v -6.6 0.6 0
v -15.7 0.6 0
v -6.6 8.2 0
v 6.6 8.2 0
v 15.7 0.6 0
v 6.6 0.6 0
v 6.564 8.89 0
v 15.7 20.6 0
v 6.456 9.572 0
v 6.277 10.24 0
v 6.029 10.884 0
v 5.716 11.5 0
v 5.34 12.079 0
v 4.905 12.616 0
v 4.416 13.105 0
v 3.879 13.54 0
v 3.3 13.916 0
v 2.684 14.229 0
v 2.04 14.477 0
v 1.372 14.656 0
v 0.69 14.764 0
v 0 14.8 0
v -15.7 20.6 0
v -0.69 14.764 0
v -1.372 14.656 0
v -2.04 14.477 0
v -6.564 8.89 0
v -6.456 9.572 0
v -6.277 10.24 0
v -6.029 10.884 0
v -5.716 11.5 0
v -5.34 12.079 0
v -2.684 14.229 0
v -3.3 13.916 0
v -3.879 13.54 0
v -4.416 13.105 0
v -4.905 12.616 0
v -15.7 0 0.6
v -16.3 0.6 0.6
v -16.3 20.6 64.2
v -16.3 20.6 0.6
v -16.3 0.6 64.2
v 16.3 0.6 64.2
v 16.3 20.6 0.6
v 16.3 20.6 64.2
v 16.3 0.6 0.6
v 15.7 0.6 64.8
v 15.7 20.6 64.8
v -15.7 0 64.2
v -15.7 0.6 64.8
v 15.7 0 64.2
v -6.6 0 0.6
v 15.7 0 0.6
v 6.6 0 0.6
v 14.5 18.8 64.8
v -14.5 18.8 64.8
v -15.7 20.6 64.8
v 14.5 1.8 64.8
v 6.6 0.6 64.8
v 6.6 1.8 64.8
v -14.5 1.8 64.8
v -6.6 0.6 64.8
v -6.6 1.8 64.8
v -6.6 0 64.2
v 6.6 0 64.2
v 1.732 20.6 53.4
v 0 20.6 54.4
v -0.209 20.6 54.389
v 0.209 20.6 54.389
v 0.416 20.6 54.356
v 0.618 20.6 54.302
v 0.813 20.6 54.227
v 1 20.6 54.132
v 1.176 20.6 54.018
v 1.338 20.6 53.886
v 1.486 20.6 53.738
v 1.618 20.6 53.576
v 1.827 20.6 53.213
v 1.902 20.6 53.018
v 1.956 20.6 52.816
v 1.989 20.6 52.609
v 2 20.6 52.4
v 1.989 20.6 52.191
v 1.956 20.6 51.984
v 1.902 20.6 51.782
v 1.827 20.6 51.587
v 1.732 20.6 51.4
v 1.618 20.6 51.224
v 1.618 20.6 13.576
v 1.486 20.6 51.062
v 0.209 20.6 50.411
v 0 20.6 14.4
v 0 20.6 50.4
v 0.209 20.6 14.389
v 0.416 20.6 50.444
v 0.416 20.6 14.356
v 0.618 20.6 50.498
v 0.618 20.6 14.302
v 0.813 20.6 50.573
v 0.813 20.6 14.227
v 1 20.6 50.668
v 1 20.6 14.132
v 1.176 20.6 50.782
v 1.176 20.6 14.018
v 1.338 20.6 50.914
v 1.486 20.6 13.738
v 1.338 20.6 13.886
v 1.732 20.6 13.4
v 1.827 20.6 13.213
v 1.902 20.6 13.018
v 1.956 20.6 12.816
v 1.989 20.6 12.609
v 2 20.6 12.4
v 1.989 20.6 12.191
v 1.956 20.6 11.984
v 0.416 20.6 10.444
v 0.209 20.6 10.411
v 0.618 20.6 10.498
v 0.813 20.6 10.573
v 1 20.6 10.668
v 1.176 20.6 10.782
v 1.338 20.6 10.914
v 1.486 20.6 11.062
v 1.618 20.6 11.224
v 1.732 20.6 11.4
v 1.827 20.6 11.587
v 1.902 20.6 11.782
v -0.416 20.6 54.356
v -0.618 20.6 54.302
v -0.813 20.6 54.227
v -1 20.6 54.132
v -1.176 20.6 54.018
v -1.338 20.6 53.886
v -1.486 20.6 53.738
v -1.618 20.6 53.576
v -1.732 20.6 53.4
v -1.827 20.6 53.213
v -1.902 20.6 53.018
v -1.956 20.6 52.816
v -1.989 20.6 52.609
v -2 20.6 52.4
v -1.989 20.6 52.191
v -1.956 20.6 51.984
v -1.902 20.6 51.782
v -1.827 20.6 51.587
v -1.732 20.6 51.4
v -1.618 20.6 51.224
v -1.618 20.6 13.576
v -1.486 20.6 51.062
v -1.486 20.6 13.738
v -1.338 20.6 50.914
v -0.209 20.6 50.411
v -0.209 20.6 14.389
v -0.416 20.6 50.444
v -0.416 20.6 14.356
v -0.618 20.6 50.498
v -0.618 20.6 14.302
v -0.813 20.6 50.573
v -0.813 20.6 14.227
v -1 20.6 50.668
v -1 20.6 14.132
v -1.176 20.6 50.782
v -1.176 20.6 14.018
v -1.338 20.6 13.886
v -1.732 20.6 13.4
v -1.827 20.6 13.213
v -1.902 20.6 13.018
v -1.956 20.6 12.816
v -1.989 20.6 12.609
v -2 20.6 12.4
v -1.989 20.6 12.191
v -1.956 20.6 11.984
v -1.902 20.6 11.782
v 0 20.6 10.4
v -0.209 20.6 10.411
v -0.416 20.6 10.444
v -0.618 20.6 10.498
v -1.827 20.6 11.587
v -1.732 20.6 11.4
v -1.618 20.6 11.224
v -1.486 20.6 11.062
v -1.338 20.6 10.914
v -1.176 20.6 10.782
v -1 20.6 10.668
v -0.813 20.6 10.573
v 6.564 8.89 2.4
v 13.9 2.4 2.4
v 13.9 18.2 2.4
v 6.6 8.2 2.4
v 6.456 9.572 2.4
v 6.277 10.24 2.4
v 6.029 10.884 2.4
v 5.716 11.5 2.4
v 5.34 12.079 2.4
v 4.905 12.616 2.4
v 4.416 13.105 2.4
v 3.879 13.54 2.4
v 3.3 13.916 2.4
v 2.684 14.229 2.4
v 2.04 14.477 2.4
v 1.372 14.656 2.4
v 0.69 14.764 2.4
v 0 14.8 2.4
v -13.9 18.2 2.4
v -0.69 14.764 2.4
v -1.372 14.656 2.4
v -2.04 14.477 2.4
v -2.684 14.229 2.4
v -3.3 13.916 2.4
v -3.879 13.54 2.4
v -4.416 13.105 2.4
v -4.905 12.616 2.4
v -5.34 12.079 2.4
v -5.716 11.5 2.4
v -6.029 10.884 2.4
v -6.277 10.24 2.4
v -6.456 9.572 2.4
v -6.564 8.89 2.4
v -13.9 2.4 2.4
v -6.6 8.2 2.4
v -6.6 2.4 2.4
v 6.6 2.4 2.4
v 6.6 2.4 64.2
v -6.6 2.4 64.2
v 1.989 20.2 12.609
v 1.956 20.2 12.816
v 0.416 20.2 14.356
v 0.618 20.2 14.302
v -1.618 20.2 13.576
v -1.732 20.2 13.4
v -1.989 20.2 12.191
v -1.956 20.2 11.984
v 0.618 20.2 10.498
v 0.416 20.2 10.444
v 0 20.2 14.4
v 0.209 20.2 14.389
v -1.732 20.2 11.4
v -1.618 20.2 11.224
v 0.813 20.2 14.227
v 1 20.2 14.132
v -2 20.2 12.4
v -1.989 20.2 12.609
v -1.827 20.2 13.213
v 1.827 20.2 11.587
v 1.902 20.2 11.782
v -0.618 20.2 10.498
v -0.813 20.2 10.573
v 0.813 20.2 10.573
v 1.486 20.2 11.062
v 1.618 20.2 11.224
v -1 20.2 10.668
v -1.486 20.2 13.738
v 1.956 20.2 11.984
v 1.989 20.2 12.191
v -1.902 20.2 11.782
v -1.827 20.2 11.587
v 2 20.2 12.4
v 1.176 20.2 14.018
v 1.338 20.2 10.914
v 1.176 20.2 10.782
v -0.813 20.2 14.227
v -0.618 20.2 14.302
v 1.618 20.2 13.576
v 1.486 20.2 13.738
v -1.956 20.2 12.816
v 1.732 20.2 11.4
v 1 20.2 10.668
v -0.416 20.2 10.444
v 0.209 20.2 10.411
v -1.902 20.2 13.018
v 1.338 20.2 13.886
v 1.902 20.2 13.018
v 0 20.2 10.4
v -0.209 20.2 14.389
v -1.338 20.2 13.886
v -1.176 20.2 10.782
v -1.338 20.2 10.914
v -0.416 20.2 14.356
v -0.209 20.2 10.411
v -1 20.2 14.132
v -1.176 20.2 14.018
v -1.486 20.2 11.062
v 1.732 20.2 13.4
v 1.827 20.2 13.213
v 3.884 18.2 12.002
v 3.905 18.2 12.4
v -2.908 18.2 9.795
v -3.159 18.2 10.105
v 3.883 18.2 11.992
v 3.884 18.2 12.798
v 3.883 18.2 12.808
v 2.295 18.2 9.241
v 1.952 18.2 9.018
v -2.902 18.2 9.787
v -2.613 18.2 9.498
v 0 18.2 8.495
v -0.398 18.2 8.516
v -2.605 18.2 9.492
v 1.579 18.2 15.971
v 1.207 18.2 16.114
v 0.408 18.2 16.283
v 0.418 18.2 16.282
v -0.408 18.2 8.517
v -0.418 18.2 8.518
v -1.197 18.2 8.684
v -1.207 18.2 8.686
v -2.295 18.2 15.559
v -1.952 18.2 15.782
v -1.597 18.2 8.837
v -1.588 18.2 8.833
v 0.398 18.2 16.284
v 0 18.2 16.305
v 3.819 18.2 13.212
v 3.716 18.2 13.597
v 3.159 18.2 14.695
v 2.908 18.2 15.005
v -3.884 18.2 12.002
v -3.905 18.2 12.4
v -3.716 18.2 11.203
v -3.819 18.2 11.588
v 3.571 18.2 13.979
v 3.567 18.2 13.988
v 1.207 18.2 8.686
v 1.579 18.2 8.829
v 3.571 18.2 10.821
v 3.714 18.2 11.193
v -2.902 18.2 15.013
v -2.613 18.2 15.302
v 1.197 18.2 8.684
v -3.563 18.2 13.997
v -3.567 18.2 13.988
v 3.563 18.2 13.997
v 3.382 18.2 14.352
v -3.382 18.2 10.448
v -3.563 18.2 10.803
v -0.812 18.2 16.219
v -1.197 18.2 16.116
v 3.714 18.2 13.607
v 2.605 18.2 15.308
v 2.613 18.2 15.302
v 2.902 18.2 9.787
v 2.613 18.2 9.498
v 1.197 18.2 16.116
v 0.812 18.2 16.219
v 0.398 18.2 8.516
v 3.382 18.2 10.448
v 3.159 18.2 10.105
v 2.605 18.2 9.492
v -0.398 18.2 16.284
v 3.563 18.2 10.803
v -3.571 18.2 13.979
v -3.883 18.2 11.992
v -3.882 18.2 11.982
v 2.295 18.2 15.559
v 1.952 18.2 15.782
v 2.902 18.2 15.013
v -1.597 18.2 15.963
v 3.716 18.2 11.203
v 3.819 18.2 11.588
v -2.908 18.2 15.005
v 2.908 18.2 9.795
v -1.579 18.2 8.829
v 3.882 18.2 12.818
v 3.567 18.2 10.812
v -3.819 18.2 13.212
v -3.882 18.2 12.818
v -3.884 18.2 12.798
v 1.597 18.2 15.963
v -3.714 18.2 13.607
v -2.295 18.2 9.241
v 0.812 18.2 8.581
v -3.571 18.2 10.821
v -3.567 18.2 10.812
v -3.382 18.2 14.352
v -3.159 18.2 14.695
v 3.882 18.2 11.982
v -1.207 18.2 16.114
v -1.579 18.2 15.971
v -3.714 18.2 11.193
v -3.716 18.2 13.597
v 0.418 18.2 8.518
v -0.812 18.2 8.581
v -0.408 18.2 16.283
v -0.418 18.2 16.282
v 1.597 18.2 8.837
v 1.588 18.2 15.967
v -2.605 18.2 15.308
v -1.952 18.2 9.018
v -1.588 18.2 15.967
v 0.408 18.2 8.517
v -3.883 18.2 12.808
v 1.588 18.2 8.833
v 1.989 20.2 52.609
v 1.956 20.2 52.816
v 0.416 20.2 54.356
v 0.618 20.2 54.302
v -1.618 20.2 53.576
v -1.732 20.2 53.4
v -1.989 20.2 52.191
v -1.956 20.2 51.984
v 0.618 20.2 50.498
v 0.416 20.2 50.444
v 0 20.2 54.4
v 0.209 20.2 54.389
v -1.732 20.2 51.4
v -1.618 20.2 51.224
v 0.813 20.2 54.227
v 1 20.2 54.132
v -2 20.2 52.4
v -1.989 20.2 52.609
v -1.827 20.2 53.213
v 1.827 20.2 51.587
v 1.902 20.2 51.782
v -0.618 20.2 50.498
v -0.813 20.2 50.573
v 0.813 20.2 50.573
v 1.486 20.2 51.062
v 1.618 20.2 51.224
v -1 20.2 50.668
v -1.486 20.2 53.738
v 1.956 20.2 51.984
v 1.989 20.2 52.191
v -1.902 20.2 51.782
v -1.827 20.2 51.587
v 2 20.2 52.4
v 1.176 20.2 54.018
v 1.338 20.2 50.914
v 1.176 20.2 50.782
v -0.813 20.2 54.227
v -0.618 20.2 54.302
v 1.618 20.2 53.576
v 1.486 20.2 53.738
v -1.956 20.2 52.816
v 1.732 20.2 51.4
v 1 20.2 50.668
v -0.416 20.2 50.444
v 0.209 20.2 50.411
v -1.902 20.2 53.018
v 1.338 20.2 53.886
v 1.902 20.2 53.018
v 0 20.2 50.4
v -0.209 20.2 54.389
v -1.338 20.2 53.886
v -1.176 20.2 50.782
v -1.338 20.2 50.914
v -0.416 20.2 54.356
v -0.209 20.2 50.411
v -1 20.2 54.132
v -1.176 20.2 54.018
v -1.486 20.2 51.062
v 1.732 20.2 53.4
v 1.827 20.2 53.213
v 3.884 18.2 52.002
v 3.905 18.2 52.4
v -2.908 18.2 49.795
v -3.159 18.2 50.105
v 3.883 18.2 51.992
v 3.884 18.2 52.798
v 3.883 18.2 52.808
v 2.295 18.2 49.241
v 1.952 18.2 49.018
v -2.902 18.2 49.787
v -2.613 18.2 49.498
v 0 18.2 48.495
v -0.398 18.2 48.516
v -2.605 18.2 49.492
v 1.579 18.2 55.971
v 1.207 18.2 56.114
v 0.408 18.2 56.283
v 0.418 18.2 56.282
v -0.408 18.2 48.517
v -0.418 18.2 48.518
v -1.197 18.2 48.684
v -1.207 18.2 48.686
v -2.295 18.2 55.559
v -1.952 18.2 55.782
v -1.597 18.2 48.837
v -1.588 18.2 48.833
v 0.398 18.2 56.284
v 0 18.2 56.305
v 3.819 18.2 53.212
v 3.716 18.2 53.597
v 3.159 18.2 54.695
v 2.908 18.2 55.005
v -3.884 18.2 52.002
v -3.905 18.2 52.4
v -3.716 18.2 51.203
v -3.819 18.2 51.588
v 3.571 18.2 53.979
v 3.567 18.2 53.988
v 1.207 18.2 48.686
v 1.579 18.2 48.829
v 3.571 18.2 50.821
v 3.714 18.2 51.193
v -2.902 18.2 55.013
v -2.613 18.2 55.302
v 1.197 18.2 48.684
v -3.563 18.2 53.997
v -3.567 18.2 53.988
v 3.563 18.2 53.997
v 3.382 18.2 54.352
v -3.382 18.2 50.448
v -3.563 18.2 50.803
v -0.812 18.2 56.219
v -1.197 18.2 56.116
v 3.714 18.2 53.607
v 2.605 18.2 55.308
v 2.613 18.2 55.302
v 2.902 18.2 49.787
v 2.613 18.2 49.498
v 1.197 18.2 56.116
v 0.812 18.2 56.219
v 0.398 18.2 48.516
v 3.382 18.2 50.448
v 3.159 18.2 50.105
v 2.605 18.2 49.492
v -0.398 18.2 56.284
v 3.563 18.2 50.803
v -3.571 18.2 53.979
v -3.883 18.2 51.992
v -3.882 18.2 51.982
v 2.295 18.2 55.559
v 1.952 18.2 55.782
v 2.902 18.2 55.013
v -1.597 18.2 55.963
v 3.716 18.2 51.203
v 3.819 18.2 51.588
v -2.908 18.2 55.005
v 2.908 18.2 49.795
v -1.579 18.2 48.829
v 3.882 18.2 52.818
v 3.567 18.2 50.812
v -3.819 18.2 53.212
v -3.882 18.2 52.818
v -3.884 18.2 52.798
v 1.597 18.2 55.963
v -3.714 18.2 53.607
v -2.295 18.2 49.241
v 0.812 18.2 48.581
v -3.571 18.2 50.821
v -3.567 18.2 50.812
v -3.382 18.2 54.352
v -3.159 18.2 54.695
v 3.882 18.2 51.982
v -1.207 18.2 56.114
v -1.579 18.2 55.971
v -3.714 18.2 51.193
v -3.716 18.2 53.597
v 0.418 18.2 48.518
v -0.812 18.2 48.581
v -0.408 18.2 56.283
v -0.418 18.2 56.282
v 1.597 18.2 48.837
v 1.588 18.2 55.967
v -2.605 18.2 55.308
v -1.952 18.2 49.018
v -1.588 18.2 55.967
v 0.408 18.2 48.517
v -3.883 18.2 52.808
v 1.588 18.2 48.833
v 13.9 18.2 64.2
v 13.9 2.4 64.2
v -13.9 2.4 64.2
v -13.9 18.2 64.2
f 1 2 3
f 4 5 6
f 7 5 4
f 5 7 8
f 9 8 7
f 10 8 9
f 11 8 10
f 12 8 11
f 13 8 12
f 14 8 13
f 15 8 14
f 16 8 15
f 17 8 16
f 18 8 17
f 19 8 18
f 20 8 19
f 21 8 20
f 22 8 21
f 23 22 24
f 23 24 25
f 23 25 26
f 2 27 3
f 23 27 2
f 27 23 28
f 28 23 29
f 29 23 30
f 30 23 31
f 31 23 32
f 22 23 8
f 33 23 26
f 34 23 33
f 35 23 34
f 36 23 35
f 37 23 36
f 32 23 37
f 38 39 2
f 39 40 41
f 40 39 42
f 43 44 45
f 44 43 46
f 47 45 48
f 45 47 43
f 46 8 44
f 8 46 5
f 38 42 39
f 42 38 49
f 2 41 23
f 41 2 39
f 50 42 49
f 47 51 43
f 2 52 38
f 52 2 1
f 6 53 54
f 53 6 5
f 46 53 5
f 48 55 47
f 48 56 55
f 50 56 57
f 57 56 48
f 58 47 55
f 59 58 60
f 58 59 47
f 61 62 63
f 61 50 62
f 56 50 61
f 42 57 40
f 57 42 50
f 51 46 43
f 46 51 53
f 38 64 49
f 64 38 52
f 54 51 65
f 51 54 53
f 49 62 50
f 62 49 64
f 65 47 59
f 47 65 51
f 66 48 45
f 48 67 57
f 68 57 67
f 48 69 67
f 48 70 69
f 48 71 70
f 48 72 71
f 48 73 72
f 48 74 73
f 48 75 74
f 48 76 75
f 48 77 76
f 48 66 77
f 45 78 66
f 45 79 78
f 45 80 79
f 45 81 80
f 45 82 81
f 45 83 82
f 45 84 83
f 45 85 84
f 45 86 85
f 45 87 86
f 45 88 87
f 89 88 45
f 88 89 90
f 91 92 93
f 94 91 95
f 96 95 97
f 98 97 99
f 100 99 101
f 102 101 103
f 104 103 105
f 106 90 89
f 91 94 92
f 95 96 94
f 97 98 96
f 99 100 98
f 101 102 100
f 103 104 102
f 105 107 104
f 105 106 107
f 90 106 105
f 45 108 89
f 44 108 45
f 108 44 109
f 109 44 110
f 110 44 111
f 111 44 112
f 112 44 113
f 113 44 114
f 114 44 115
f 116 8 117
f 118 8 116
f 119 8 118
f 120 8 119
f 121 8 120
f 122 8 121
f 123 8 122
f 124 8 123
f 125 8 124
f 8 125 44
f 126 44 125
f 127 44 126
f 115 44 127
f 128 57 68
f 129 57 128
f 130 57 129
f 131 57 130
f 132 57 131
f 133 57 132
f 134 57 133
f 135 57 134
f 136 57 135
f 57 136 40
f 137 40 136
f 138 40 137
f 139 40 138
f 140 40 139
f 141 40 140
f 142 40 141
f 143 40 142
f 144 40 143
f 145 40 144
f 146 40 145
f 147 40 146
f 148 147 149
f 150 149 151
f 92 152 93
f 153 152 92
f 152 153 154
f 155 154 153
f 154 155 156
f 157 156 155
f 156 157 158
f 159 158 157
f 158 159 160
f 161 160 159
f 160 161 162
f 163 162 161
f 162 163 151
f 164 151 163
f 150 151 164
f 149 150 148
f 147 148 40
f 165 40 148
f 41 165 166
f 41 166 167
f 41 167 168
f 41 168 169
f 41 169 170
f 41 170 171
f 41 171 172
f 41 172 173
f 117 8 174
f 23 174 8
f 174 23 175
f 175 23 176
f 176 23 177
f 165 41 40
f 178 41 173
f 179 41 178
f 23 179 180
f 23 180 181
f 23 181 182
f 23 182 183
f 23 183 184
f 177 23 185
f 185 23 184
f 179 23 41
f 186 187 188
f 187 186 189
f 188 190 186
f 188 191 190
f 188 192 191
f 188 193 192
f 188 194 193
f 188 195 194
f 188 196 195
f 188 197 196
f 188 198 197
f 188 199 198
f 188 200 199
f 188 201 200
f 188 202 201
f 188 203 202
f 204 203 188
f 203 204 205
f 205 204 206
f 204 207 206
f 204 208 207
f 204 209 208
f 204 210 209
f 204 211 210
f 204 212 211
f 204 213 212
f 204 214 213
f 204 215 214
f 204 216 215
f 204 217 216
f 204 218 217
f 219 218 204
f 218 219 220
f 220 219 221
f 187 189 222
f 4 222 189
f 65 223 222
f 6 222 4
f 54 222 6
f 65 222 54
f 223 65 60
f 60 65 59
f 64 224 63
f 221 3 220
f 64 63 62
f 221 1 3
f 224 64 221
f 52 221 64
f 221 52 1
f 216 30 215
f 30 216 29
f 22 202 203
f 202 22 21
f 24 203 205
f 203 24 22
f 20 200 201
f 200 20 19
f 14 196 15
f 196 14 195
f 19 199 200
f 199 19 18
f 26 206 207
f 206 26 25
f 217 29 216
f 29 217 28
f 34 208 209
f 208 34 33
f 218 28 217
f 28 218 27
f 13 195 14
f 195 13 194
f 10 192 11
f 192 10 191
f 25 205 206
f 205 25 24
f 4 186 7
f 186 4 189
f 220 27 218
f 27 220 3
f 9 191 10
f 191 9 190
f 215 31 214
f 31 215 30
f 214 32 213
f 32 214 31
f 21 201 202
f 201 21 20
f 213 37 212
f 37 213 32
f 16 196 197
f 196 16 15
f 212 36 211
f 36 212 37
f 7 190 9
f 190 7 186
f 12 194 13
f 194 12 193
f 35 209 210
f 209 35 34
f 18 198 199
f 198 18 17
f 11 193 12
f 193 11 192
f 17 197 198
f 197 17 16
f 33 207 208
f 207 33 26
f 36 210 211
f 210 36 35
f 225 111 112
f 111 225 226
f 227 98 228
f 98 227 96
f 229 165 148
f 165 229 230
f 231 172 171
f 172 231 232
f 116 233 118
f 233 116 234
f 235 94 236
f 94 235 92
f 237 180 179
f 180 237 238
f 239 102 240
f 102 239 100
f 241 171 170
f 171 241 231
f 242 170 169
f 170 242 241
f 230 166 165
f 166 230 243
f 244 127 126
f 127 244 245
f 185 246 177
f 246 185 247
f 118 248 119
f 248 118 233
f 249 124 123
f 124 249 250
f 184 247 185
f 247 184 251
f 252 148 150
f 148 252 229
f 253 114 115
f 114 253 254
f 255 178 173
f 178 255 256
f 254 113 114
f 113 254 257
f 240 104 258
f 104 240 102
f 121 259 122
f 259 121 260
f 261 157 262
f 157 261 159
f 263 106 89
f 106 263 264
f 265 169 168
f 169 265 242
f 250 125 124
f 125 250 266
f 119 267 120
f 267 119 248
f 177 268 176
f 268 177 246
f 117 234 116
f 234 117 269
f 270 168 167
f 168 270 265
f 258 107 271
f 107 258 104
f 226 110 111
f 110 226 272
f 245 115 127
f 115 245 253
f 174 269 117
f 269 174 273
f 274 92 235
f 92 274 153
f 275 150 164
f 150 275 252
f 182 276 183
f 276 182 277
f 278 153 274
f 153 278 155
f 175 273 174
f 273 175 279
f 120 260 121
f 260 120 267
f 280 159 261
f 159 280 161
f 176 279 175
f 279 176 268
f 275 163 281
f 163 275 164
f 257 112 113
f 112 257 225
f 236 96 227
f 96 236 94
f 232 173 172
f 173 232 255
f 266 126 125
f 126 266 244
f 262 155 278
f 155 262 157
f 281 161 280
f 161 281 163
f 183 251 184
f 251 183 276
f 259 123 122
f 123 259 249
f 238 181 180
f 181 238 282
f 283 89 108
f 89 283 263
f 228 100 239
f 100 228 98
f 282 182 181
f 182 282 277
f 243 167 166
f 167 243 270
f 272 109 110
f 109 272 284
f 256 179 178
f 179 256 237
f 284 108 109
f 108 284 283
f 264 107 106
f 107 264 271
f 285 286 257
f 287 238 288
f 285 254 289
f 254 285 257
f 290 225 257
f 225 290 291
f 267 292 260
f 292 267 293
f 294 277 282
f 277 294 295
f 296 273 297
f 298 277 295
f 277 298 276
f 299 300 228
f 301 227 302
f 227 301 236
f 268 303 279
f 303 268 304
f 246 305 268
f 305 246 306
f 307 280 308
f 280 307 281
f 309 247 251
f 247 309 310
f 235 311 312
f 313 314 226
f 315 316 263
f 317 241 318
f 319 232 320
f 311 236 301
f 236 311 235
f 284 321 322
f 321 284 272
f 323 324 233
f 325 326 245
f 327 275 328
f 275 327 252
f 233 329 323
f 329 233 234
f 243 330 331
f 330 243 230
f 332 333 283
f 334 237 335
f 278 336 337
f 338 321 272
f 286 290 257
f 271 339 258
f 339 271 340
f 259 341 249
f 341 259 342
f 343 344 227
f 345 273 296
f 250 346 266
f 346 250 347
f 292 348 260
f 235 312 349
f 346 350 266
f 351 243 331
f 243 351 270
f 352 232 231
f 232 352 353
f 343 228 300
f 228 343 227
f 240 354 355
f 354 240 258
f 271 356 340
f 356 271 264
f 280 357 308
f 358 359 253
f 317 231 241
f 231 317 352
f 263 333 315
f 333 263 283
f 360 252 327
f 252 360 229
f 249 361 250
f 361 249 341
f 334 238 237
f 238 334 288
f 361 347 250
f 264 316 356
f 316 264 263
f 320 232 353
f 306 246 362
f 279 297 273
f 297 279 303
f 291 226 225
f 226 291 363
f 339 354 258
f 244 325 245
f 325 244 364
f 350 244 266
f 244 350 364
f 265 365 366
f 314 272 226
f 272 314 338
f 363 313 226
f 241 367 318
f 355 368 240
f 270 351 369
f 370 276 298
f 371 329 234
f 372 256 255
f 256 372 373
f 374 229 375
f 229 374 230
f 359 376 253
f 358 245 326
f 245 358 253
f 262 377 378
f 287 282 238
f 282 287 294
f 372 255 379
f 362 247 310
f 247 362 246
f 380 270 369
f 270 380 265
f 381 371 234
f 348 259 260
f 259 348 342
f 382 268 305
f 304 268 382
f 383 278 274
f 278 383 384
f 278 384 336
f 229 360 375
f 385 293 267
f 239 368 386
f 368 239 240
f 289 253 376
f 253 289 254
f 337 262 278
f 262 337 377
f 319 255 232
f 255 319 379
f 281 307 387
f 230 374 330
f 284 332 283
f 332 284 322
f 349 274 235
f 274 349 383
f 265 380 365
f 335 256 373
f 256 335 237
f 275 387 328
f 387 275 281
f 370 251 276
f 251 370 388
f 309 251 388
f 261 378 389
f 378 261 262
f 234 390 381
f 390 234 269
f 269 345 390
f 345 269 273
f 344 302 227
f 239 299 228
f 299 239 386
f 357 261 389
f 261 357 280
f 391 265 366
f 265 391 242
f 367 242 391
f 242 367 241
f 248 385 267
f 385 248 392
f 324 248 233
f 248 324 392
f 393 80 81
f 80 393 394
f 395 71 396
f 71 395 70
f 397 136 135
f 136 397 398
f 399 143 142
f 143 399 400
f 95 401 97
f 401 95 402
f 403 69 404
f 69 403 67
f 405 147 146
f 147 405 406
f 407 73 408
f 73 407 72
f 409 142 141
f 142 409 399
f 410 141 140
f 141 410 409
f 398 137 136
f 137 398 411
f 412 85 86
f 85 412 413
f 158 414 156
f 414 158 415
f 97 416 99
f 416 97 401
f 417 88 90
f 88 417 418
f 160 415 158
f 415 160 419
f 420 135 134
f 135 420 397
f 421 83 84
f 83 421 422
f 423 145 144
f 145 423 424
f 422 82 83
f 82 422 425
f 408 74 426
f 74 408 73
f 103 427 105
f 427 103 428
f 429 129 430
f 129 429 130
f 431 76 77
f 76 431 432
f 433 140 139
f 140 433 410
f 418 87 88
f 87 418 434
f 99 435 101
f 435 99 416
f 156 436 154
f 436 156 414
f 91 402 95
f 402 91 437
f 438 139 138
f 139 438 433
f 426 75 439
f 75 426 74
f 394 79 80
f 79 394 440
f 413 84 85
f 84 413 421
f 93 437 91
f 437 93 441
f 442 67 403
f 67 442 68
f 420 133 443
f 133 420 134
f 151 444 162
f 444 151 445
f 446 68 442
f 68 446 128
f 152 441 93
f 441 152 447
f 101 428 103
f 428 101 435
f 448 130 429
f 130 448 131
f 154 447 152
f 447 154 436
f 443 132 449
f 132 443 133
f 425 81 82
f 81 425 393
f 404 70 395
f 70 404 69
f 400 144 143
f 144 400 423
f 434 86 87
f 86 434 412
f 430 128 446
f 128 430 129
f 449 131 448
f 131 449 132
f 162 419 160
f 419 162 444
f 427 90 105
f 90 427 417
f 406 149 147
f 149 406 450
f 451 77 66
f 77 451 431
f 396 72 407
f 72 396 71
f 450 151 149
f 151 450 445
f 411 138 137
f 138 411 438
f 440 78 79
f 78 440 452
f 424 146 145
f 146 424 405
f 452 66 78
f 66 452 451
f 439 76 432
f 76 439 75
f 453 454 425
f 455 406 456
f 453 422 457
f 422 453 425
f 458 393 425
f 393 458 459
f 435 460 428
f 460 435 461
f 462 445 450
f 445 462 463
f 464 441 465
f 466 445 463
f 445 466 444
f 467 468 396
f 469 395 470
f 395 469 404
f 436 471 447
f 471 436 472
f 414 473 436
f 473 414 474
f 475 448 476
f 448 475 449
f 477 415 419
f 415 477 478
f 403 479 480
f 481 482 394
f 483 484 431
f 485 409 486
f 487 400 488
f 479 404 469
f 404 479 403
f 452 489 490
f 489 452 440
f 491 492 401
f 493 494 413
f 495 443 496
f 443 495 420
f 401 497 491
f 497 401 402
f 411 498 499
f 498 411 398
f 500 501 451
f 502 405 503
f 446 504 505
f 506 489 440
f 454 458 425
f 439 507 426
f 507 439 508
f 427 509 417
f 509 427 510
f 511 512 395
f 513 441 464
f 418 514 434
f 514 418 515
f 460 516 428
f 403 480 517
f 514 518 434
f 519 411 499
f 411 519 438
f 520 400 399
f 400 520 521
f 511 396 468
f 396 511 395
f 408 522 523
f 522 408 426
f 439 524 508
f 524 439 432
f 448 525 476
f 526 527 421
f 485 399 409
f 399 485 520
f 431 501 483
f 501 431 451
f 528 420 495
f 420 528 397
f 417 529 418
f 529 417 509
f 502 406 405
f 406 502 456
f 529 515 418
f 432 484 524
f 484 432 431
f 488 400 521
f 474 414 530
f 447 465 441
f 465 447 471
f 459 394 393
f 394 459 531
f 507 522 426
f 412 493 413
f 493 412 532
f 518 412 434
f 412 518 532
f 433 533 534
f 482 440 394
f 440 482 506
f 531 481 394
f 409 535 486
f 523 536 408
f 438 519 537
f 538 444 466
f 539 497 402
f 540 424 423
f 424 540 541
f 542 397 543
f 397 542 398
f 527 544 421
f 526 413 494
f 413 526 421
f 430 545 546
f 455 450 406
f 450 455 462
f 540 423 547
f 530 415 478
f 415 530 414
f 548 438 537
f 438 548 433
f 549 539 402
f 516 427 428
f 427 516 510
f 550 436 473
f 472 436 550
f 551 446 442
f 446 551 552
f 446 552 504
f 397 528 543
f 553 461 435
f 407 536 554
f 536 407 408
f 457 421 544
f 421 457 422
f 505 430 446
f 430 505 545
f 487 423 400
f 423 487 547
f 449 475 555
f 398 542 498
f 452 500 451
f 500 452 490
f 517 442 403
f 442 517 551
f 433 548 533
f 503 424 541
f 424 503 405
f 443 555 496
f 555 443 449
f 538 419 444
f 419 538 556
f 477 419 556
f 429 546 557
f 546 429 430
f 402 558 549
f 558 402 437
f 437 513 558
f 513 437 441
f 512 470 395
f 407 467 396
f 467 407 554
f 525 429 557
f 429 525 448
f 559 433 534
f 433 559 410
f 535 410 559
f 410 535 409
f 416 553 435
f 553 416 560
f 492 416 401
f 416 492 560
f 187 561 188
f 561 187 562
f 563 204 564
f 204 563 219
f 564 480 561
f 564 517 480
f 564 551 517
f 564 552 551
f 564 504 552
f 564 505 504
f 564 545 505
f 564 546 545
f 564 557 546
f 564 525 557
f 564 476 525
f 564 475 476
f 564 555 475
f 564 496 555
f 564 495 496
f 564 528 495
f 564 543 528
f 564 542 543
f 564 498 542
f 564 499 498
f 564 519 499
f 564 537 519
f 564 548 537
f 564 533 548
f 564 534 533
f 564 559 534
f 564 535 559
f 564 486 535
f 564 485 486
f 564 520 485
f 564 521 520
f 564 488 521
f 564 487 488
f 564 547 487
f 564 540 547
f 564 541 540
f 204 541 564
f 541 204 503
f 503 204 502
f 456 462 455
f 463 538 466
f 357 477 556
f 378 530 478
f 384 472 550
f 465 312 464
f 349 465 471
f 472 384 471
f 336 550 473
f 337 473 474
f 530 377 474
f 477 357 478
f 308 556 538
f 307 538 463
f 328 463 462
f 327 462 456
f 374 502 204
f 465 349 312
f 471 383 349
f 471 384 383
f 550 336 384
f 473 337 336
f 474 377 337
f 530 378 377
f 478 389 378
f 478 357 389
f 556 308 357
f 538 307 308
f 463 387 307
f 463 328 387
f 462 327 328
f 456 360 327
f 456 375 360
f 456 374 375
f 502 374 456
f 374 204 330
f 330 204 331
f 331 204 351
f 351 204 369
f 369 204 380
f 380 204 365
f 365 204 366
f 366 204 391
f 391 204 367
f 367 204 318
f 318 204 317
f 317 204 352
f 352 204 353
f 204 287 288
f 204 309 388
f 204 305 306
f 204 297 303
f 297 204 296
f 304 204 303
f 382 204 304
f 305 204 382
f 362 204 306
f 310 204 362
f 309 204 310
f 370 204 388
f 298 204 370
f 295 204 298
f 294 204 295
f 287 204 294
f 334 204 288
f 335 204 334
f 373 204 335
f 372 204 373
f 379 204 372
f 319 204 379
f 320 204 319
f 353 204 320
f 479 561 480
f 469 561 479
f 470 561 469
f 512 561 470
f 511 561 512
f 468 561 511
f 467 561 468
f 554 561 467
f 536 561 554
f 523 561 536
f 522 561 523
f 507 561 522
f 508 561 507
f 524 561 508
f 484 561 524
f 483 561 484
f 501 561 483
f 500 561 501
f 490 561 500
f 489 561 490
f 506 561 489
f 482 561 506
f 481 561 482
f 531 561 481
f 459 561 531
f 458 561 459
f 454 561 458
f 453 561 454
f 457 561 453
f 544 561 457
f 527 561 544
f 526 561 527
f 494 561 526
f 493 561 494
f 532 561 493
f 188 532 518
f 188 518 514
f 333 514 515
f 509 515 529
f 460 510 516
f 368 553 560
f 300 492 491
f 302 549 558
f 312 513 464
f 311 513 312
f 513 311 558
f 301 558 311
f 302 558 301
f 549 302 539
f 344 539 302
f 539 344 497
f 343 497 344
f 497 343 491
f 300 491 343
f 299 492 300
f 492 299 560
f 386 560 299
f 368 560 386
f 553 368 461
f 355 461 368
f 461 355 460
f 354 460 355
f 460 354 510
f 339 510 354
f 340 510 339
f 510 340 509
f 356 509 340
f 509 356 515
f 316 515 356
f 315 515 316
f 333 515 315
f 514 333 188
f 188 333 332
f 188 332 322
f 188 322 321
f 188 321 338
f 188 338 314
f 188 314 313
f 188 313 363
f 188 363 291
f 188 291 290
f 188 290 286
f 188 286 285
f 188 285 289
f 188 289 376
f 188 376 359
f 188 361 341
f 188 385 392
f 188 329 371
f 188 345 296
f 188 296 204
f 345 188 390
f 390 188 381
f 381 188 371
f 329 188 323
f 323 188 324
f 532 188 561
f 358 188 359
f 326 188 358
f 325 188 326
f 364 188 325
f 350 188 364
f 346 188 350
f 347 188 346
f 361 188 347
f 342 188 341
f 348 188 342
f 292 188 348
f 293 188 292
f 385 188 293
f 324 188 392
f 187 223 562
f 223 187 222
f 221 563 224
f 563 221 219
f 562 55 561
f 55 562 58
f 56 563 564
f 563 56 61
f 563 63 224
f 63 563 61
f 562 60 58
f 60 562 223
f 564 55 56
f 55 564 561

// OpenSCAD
// Parametric Pocket-Style Wall Mount for Inline Light Switch
// Version: 0.30

/* [Switch Dimensions] */
switch_width     = 27.0; // [mm] Core body width
switch_thickness = 15.0; // [mm] Core body thickness
switch_length    = 62.0; // [mm] Core body length

/* [Switch Features] */
switch_actuator_inset = 20.0; // [mm] Distance from end to start of actuator cutout
switch_actuator_width = 12.0; // [mm] Actuator cutout width

/* [Mounting & Print Options] */
wall_clearance  = 0.4; // [mm] Extra space for smooth slide fit
wall_thickness  = 2.4; // [mm] Pocket wall thickness
bottom_rear_lip = 4.0; // [mm] Solid bottom ledge left at the back for rigidity
chamfer_size    = 0.6; // [mm] Size of edge chamfers
screw_d         = 4.0; // [mm] Screw shaft diameter
screw_head_d    = 8.0; // [mm] Screw head countersink diameter

$fn = 60;

// Internal pocket dimensions
pw = switch_width + 2 * wall_clearance;
pt = switch_thickness + 2 * wall_clearance;
pl = switch_length + wall_clearance;

// Outer shell dimensions
cw = pw + 2 * wall_thickness;
ct = pt + 2 * wall_thickness;
cl = pl + wall_thickness;

// Cutout dimensions
cutout_w = switch_actuator_width;
radius = cutout_w / 2;
cutout_y_end = wall_thickness + pt - bottom_rear_lip - radius;

// 1. Outer Shell with Mitered 3D Octahedral Chamfers (Flat Back Wall)
module outer_shell_chamfered() {
    c = chamfer_size;
    difference() {
        minkowski() {
            translate([-(cw/2 - c), c, c])
                cube([cw - 2*c, ct - c, cl - 2*c]);
            
            // 3D Octahedron chamfer element creates clean mitered 3-way corners
            polyhedron(
                points = [
                    [c,0,0], [-c,0,0],
                    [0,c,0], [0,-c,0],
                    [0,0,c], [0,0,-c]
                ],
                faces = [
                    [0,2,4], [2,1,4], [1,3,4], [3,0,4],
                    [2,0,5], [1,2,5], [3,1,5], [0,3,5]
                ]
            );
        }

        // Crop extension past y = ct so back wall remains 100% flat
        translate([-(cw + 10)/2, ct, -10])
            cube([cw + 10, c + 10, cl + 20]);
    }
}

// 2. Inverted Truncated Pyramid Cutter for Inner Top Rim
module inner_top_chamfer_cutter() {
    c = chamfer_size;
    hull() {
        // Lower footprint at z = cl - c
        translate([-pw/2, wall_thickness, cl - c])
            cube([pw, pt, 0.01]);
        
        // Upper footprint at z = cl + 1
        translate([-(pw/2 + c + 1), wall_thickness - c - 1, cl + 1])
            cube([pw + 2*(c + 1), pt + 2*(c + 1), 0.01]);
    }
}

// 3. Perfected Front Slot Cutter (Split Z-sections to prevent skins and floor gouges)
module front_slot_cutter() {
    c = chamfer_size;
    w = cutout_w;
    t = wall_thickness;

    // LOWER section: z = -1 to t
    translate([0, 0, -1])
        linear_extrude(h = t + 1.01) {
            polygon(points = [
                [-(w/2 + c), -1],
                [-(w/2 + c), 0],
                [-w/2, c],
                [-w/2, t],
                [w/2, t],
                [w/2, c],
                [w/2 + c, 0],
                [w/2 + c, -1]
            ]);
        }

    // UPPER section: z = t to cl + 2
    translate([0, 0, t])
        linear_extrude(h = cl - t + 2) {
            polygon(points = [
                [-(w/2 + c), -1],
                [-(w/2 + c), 0],
                [-w/2, c],
                [-w/2, t - c],
                [-(w/2 + c), t],
                [-(w/2 + c), t + 2],
                [w/2 + c, t + 2],
                [w/2 + c, t],
                [w/2, t - c],
                [w/2, c],
                [w/2 + c, 0],
                [w/2 + c, -1]
            ]);
        }

    // Top rim horizontal chamfer cleanly miters with the vertical chamfers
    hull() {
        translate([0, 0, cl - c])
            linear_extrude(h = 0.01)
                translate([-w/2, -1])
                    square([w, t + 2]);
        
        translate([0, 0, cl + 0.01])
            linear_extrude(h = 0.01)
                translate([-(w/2 + c), -1])
                    square([w + 2*c, t + 2]);
    }
}

// 4. Bottom Floor Cutout with Perfectly Extended Top Edge Chamfer
module bottom_floor_cutout_with_chamfer() {
    c = chamfer_size;
    
    // Straight pass-through void through floor
    translate([0, 0, -0.1])
        linear_extrude(h = wall_thickness + 1.2) {
            translate([-cutout_w/2, -1])
                square([cutout_w, cutout_y_end + 1]);
            translate([0, cutout_y_end])
                circle(r = radius);
        }
    
    // Smooth flared 45° chamfer transition strictly at the bottom (z = 0)
    translate([0, 0, -0.01]) {
        hull() {
            // Bottom wide footprint
            linear_extrude(h = 0.01) {
                translate([-(cutout_w/2 + c), -1])
                    square([cutout_w + 2*c, cutout_y_end + 1]);
                translate([0, cutout_y_end])
                    circle(r = radius + c);
            }
            
            // Upper normal footprint
            translate([0, 0, c + 0.01])
                linear_extrude(h = 0.01) {
                    translate([-cutout_w/2, -1])
                        square([cutout_w, cutout_y_end + 1]);
                    translate([0, cutout_y_end])
                        circle(r = radius);
                }
        }
    }

    // Smooth flared 45° chamfer transition at the top of the floor, perfectly extended to meet the vertical chamfer
    intersection() {
        translate([0, 0, wall_thickness - c]) {
            hull() {
                linear_extrude(h = 0.01) {
                    translate([-cutout_w/2, -1])
                        square([cutout_w, cutout_y_end + 1]);
                    translate([0, cutout_y_end])
                        circle(r = radius);
                }
                
                translate([0, 0, c + 0.01])
                    linear_extrude(h = 0.01) {
                        translate([-(cutout_w/2 + c), -1])
                            square([cutout_w + 2*c, cutout_y_end + 1]);
                        translate([0, cutout_y_end])
                            circle(r = radius + c);
                    }
            }
        }
        // Restrict top floor chamfer to stop right before biting into the outer front wall face
        translate([-cw, wall_thickness - c, -1])
            cube([2*cw, ct, cl + 5]);
    }
}

// 5. Countersunk Back Wall Screw Holes (Exact 40mm center-to-center distance)
module screw_holes() {
    screw_spacing = 40.0; // [mm] Distance between screw hole centers
    mid_z = cl / 2;
    screw_z1 = mid_z - (screw_spacing / 2);
    screw_z2 = mid_z + (screw_spacing / 2);

    for (z_pos = [screw_z1, screw_z2]) {
        translate([0, ct - wall_thickness, z_pos]) {
            rotate([-90, 0, 0]) {
                cylinder(d = screw_d, h = wall_thickness + 1);
                translate([0, 0, -0.1])
                    cylinder(d1 = screw_head_d, d2 = screw_d, h = (screw_head_d - screw_d) / 2 + 0.1);
            }
        }
    }
}

// Final Pocket Mount Assembly
module inline_switch_pocket_mount() {
    difference() {
        // Outer chamfered shell
        outer_shell_chamfered();

        // Inner main pocket void
        translate([-pw/2, wall_thickness, wall_thickness])
            cube([pw, pt, cl + 1]);

        // Mitered top inner rim chamfer
        inner_top_chamfer_cutter();

        // Front slot with perfectly mitered inner/outer 2D chamfers
        front_slot_cutter();

        // Bottom floor slot with perfected top chamfer
        bottom_floor_cutout_with_chamfer();

        // Mounting screw holes
        screw_holes();
    }
}

inline_switch_pocket_mount();
